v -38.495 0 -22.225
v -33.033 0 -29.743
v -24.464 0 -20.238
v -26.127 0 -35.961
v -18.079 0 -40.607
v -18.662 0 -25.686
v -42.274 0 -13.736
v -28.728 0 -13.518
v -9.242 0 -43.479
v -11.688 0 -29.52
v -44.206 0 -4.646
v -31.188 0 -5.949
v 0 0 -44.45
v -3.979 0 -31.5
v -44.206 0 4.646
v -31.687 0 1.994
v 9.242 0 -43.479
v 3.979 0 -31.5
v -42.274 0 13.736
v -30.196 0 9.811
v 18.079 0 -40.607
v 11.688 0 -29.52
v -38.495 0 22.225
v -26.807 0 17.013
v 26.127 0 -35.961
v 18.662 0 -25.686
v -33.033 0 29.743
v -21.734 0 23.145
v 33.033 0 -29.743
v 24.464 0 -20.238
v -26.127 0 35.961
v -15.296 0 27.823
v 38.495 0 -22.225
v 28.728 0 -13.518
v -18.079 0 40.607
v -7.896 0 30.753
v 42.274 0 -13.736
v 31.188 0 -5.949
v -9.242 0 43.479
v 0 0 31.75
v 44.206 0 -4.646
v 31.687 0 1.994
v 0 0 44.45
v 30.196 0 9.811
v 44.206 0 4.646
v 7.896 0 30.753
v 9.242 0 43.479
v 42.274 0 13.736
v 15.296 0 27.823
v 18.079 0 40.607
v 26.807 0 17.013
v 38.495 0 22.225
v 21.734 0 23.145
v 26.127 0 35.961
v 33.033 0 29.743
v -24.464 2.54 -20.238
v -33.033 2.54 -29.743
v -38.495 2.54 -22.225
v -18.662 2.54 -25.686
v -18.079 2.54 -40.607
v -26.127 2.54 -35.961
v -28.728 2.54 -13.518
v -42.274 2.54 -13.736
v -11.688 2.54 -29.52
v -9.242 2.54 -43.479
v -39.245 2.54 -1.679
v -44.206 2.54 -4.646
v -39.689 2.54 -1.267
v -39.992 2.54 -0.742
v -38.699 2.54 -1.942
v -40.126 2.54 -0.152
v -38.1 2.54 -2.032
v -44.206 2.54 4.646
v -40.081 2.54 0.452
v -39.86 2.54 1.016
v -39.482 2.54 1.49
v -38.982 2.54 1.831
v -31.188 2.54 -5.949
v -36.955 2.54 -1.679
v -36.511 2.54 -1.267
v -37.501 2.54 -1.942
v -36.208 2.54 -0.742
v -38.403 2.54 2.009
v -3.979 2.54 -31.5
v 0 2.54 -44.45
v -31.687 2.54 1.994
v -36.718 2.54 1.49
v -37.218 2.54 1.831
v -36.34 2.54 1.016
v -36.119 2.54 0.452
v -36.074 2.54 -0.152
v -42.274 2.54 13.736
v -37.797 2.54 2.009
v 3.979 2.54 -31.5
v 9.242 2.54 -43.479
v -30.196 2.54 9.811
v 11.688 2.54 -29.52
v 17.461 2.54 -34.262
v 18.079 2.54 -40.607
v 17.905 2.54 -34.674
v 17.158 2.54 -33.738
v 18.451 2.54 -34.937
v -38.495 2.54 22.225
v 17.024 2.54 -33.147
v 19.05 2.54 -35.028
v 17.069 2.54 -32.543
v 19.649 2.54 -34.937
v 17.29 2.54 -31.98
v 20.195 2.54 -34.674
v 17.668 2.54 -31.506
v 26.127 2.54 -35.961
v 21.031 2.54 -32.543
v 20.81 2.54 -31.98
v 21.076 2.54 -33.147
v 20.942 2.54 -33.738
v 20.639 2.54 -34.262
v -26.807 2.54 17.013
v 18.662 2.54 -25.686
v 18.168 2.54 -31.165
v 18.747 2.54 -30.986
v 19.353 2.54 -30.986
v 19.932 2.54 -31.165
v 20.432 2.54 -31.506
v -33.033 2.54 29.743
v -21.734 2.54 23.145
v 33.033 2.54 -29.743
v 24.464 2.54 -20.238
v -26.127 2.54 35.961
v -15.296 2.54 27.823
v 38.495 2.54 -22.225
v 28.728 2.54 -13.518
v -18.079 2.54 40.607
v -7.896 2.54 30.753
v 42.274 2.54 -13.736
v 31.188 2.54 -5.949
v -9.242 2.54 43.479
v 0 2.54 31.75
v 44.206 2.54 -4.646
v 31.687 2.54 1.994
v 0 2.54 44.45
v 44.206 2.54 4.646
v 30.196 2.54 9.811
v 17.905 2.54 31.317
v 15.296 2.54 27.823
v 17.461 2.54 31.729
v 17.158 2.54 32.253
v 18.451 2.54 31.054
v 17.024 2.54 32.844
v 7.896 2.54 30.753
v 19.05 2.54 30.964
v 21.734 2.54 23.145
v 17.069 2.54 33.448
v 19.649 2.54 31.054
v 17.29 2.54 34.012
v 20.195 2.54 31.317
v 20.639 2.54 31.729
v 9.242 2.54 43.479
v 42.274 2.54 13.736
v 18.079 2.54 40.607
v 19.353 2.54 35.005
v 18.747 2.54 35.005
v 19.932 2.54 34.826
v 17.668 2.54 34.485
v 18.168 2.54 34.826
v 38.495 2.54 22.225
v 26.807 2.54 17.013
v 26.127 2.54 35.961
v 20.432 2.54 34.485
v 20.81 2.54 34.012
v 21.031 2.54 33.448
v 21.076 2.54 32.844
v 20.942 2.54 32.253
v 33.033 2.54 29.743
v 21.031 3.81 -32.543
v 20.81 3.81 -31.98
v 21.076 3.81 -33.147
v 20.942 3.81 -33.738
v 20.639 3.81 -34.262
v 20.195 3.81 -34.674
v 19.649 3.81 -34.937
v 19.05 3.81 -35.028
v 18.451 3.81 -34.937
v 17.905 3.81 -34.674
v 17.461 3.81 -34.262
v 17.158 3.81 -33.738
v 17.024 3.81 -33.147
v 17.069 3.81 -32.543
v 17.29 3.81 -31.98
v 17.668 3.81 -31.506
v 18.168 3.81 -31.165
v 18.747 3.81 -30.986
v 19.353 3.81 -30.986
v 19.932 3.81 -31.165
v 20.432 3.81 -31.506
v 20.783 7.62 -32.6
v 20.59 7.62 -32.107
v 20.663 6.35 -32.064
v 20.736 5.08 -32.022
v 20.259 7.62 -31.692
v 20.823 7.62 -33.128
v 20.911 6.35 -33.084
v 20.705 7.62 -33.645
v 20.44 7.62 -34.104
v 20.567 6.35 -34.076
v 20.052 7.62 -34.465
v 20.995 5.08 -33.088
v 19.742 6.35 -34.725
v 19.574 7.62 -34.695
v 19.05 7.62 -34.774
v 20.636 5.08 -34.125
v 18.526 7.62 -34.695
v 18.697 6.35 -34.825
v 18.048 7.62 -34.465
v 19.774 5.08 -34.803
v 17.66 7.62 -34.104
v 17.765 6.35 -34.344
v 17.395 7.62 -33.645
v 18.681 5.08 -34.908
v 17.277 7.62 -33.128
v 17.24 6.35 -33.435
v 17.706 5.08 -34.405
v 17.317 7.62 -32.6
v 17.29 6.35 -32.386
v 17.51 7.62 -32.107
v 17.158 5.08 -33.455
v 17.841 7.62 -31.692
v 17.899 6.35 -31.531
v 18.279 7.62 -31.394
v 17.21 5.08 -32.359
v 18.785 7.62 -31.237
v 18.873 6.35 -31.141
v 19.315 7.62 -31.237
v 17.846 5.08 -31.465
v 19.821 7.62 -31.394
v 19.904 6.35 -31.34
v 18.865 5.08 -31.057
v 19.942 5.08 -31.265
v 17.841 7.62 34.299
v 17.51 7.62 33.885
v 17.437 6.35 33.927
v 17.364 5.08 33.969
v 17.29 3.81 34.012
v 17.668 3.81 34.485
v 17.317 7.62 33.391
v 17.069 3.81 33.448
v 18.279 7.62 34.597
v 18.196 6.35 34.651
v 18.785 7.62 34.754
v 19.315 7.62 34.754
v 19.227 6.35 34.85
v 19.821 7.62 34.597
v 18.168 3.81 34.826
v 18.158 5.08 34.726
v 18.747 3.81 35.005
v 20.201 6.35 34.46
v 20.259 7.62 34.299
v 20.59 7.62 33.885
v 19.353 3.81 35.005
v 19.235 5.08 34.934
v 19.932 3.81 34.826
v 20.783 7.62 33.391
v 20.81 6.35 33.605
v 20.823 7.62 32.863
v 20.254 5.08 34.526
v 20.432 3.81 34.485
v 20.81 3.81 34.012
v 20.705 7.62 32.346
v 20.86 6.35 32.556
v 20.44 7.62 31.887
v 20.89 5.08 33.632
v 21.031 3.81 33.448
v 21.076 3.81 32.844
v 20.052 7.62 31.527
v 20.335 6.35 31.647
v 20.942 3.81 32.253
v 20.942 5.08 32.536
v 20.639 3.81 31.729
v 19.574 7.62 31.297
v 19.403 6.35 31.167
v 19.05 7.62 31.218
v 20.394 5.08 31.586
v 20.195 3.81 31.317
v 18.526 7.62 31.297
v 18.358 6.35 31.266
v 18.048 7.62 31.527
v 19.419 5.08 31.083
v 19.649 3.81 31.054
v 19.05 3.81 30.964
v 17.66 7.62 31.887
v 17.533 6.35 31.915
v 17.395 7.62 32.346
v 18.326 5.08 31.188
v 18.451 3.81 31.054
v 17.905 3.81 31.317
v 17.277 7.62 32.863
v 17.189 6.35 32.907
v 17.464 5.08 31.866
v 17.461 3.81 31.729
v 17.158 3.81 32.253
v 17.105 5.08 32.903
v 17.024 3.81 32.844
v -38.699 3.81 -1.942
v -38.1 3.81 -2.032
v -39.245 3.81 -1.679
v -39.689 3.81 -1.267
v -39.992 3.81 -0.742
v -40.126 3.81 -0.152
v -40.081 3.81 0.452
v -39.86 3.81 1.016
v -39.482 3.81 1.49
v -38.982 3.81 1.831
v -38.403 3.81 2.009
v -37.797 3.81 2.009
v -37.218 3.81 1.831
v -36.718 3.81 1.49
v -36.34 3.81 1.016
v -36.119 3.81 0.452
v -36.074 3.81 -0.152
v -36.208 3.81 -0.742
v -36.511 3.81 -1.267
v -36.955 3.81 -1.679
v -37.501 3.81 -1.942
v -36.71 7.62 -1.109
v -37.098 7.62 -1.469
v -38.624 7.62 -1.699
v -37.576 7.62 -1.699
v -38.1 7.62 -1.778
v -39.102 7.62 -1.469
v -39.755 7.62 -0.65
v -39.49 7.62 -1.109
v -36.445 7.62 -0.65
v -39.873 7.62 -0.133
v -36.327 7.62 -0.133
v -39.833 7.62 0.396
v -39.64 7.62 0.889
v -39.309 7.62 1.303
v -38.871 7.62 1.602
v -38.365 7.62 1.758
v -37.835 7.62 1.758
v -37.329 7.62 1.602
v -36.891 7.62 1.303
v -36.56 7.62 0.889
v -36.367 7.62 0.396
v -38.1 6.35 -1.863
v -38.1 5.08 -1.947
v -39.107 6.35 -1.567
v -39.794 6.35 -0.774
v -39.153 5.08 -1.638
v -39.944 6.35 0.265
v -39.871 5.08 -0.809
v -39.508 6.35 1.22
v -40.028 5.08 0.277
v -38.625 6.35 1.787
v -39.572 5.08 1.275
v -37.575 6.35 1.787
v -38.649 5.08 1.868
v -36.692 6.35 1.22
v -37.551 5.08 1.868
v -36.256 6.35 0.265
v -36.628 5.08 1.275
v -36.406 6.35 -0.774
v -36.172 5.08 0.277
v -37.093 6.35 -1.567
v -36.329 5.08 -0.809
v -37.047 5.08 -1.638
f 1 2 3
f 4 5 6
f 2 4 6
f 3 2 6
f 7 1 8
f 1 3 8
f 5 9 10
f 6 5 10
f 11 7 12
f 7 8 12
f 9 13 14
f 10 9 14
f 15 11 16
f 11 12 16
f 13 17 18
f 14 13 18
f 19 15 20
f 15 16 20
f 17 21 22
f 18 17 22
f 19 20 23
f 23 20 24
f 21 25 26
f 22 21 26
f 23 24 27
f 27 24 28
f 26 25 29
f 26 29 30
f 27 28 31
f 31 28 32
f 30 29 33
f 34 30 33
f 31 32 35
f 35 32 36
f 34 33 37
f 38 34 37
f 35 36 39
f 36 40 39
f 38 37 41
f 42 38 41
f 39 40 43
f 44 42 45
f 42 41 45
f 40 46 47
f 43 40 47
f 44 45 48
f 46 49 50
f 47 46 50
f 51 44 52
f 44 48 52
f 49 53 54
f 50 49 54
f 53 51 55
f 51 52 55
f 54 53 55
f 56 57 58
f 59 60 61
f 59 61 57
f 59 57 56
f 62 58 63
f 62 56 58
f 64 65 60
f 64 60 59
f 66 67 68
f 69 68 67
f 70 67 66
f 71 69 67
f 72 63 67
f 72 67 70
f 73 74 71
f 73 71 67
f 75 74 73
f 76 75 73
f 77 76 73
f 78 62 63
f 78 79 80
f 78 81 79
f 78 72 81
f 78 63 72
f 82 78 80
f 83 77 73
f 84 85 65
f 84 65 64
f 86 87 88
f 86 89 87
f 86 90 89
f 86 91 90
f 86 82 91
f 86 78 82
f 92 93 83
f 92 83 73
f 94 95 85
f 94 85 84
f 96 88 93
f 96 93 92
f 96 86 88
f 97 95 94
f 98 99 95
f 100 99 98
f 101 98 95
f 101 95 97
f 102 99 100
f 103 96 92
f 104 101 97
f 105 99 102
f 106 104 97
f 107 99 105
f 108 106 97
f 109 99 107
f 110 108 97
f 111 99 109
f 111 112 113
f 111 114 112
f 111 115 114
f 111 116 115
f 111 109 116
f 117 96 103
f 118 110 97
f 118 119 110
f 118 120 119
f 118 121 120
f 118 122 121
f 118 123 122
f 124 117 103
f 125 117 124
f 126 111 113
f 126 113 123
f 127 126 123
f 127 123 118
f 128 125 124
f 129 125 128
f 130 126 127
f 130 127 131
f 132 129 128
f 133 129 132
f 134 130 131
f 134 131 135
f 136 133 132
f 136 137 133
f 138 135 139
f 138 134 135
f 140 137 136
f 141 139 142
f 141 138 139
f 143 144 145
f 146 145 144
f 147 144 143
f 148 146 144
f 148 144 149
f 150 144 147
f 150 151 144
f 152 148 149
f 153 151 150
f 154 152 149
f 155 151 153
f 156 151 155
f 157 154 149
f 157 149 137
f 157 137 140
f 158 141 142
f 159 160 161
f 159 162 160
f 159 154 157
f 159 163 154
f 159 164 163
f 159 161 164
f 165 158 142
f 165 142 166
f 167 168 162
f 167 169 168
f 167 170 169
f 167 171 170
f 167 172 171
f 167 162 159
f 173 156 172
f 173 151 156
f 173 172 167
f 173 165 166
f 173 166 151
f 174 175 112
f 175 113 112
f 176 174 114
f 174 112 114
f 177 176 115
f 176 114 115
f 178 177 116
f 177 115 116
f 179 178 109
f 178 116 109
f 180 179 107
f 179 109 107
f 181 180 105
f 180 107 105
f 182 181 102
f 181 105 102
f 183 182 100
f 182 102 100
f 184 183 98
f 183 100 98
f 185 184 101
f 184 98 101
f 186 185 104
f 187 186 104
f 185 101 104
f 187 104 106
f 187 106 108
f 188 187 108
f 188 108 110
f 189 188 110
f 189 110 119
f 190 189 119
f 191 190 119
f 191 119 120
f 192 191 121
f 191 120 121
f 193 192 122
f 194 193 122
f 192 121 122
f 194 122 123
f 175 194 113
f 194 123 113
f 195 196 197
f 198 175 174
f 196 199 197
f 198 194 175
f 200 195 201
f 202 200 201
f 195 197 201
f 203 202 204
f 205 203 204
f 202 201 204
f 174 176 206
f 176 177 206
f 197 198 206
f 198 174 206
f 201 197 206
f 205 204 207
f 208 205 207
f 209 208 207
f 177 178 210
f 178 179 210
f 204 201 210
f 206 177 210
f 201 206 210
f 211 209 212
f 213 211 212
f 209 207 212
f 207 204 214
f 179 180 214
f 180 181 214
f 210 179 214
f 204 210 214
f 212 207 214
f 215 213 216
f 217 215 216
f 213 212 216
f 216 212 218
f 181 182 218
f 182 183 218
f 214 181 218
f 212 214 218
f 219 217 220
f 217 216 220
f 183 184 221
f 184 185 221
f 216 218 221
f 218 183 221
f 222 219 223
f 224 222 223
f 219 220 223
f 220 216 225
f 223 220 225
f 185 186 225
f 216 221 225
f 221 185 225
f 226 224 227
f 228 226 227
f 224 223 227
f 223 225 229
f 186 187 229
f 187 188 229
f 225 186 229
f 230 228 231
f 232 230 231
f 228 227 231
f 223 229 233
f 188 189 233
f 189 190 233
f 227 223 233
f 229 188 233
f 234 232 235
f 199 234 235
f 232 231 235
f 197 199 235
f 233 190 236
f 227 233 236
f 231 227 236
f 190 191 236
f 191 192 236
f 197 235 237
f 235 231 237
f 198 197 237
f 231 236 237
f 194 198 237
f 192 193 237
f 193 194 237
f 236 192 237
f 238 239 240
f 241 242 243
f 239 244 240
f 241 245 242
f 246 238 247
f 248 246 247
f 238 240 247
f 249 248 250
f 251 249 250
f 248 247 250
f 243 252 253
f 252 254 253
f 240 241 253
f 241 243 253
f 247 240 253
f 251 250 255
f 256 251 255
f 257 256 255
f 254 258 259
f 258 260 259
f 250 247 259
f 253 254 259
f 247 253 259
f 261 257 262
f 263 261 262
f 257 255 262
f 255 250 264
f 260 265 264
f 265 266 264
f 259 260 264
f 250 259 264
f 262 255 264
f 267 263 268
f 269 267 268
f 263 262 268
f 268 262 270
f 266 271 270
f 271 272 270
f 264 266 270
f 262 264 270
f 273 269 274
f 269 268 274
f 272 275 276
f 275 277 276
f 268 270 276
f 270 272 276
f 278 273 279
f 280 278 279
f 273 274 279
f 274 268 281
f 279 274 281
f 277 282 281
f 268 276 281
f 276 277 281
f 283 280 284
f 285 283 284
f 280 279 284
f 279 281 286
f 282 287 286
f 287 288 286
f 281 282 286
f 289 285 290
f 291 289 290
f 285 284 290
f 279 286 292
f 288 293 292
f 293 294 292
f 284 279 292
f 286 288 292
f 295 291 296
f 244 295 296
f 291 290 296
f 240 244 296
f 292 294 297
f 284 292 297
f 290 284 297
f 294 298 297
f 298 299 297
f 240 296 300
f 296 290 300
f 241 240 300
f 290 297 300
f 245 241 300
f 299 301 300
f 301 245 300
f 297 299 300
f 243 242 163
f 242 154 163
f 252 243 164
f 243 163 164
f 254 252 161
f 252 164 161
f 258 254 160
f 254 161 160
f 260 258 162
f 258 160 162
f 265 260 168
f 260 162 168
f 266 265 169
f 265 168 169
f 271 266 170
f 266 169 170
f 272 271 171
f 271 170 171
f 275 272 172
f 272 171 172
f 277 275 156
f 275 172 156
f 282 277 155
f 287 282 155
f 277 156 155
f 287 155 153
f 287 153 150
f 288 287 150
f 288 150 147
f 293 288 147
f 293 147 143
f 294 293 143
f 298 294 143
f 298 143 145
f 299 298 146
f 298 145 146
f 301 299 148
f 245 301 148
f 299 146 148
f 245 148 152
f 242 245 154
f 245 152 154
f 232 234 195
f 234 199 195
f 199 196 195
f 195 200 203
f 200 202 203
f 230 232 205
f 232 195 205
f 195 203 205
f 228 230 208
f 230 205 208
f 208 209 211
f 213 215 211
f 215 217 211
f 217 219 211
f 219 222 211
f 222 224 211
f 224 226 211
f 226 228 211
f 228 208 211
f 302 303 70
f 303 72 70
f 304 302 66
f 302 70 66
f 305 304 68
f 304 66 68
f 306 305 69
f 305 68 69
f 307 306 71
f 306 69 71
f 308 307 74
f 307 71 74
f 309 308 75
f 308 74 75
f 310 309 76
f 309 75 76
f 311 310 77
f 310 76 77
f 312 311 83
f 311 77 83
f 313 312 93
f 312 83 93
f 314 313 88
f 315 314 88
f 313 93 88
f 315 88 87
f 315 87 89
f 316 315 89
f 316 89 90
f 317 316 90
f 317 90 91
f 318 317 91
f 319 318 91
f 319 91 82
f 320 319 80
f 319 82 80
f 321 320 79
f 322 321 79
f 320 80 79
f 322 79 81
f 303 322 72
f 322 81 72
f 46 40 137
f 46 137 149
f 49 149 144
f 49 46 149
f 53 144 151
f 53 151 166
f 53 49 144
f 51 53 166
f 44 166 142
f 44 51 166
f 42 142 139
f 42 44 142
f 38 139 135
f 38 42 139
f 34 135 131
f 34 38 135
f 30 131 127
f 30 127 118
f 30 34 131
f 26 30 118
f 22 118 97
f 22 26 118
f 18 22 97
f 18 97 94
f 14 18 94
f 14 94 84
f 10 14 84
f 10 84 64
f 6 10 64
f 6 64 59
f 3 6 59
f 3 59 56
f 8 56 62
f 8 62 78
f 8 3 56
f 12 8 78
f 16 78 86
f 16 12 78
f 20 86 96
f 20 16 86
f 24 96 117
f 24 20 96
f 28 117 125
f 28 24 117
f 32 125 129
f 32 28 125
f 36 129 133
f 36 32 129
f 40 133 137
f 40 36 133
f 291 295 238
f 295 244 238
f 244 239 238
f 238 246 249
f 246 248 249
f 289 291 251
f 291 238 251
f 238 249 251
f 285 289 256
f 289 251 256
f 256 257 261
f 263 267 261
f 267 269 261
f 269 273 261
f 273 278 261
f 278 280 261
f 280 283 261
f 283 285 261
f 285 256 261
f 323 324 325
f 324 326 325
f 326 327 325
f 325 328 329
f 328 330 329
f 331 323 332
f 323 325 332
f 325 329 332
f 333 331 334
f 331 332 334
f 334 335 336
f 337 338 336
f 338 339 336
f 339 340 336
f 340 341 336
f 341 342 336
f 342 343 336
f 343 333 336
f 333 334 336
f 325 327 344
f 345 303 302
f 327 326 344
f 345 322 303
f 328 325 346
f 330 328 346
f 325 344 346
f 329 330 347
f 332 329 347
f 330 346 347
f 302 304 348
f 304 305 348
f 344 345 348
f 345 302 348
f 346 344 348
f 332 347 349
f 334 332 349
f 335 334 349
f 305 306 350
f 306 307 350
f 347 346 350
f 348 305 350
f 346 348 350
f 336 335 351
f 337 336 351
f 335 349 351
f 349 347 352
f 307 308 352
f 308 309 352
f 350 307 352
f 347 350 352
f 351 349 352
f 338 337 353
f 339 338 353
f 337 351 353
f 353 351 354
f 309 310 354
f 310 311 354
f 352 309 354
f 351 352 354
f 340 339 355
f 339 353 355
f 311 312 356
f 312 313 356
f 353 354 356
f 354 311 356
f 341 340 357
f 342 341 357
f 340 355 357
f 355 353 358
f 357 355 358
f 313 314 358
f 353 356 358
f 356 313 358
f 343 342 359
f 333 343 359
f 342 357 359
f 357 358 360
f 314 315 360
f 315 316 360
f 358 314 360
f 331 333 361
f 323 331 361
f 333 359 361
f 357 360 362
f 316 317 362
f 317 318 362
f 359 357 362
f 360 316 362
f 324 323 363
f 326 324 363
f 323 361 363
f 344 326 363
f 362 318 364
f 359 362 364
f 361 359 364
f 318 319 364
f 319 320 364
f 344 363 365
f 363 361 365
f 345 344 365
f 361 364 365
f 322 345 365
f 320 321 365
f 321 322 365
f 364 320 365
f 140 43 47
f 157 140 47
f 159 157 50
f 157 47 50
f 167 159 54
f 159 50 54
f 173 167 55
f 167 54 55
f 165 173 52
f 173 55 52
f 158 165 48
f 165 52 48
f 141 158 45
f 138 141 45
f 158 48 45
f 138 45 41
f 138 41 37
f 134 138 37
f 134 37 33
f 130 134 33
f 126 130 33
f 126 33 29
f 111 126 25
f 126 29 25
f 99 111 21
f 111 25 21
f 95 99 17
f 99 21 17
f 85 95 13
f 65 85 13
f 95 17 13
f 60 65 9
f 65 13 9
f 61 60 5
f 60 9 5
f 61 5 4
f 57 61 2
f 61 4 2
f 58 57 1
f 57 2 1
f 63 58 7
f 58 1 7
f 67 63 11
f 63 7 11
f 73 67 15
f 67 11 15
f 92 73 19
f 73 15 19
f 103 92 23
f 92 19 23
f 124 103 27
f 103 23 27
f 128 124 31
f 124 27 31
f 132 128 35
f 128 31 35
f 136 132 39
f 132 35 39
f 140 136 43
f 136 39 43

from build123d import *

# Parameters (mm, degrees)
SKETCH1_R           = 44.45
SKETCH1_R_2         = 31.75
BOSS_EXTRUDE1_DEPTH = 2.54
CIRPATTERN1_COUNT   = 3


with BuildPart() as part:
    # Sketch1 → Boss-Extrude1 (new body)
    with BuildSketch(Plane(origin=(0, 0, 0), x_dir=(1, 0, 0), z_dir=(0, 1, 0))):
        with Locations(Location((0, 0, 0), (0, 0, 270))):
            Circle(SKETCH1_R)
        with Locations(Location((0, 0, 0), (0, 0, 270))):
            Circle(SKETCH1_R_2, mode=Mode.SUBTRACT)
    extrude(amount=BOSS_EXTRUDE1_DEPTH)

    # Sketch4 → Revolve1 (revolve)
    with BuildSketch(Plane.XY, mode=Mode.PRIVATE) as revolve1_sk:
        Polygon((-38.1, 2.54), (-38.1, 7.62), (-39.878, 7.62), (-40.132, 3.81), (-40.132, 2.54), align=None)
    revolve1 = revolve(revolve1_sk.sketch.rotate(Axis((-38.1, 2.54, 0), (0, 1, 0)), 270), axis=Axis((-38.1, 2.54, 0), (0, 1, 0)))

    # CirPattern1: Revolve1 ×3 about axis
    cirpattern1_axis = Axis((0, 0, 0), (0, 1, 0))
    for i in range(1, CIRPATTERN1_COUNT):
        add(revolve1.rotate(cirpattern1_axis, i * 360 / CIRPATTERN1_COUNT))


solid = part.part
